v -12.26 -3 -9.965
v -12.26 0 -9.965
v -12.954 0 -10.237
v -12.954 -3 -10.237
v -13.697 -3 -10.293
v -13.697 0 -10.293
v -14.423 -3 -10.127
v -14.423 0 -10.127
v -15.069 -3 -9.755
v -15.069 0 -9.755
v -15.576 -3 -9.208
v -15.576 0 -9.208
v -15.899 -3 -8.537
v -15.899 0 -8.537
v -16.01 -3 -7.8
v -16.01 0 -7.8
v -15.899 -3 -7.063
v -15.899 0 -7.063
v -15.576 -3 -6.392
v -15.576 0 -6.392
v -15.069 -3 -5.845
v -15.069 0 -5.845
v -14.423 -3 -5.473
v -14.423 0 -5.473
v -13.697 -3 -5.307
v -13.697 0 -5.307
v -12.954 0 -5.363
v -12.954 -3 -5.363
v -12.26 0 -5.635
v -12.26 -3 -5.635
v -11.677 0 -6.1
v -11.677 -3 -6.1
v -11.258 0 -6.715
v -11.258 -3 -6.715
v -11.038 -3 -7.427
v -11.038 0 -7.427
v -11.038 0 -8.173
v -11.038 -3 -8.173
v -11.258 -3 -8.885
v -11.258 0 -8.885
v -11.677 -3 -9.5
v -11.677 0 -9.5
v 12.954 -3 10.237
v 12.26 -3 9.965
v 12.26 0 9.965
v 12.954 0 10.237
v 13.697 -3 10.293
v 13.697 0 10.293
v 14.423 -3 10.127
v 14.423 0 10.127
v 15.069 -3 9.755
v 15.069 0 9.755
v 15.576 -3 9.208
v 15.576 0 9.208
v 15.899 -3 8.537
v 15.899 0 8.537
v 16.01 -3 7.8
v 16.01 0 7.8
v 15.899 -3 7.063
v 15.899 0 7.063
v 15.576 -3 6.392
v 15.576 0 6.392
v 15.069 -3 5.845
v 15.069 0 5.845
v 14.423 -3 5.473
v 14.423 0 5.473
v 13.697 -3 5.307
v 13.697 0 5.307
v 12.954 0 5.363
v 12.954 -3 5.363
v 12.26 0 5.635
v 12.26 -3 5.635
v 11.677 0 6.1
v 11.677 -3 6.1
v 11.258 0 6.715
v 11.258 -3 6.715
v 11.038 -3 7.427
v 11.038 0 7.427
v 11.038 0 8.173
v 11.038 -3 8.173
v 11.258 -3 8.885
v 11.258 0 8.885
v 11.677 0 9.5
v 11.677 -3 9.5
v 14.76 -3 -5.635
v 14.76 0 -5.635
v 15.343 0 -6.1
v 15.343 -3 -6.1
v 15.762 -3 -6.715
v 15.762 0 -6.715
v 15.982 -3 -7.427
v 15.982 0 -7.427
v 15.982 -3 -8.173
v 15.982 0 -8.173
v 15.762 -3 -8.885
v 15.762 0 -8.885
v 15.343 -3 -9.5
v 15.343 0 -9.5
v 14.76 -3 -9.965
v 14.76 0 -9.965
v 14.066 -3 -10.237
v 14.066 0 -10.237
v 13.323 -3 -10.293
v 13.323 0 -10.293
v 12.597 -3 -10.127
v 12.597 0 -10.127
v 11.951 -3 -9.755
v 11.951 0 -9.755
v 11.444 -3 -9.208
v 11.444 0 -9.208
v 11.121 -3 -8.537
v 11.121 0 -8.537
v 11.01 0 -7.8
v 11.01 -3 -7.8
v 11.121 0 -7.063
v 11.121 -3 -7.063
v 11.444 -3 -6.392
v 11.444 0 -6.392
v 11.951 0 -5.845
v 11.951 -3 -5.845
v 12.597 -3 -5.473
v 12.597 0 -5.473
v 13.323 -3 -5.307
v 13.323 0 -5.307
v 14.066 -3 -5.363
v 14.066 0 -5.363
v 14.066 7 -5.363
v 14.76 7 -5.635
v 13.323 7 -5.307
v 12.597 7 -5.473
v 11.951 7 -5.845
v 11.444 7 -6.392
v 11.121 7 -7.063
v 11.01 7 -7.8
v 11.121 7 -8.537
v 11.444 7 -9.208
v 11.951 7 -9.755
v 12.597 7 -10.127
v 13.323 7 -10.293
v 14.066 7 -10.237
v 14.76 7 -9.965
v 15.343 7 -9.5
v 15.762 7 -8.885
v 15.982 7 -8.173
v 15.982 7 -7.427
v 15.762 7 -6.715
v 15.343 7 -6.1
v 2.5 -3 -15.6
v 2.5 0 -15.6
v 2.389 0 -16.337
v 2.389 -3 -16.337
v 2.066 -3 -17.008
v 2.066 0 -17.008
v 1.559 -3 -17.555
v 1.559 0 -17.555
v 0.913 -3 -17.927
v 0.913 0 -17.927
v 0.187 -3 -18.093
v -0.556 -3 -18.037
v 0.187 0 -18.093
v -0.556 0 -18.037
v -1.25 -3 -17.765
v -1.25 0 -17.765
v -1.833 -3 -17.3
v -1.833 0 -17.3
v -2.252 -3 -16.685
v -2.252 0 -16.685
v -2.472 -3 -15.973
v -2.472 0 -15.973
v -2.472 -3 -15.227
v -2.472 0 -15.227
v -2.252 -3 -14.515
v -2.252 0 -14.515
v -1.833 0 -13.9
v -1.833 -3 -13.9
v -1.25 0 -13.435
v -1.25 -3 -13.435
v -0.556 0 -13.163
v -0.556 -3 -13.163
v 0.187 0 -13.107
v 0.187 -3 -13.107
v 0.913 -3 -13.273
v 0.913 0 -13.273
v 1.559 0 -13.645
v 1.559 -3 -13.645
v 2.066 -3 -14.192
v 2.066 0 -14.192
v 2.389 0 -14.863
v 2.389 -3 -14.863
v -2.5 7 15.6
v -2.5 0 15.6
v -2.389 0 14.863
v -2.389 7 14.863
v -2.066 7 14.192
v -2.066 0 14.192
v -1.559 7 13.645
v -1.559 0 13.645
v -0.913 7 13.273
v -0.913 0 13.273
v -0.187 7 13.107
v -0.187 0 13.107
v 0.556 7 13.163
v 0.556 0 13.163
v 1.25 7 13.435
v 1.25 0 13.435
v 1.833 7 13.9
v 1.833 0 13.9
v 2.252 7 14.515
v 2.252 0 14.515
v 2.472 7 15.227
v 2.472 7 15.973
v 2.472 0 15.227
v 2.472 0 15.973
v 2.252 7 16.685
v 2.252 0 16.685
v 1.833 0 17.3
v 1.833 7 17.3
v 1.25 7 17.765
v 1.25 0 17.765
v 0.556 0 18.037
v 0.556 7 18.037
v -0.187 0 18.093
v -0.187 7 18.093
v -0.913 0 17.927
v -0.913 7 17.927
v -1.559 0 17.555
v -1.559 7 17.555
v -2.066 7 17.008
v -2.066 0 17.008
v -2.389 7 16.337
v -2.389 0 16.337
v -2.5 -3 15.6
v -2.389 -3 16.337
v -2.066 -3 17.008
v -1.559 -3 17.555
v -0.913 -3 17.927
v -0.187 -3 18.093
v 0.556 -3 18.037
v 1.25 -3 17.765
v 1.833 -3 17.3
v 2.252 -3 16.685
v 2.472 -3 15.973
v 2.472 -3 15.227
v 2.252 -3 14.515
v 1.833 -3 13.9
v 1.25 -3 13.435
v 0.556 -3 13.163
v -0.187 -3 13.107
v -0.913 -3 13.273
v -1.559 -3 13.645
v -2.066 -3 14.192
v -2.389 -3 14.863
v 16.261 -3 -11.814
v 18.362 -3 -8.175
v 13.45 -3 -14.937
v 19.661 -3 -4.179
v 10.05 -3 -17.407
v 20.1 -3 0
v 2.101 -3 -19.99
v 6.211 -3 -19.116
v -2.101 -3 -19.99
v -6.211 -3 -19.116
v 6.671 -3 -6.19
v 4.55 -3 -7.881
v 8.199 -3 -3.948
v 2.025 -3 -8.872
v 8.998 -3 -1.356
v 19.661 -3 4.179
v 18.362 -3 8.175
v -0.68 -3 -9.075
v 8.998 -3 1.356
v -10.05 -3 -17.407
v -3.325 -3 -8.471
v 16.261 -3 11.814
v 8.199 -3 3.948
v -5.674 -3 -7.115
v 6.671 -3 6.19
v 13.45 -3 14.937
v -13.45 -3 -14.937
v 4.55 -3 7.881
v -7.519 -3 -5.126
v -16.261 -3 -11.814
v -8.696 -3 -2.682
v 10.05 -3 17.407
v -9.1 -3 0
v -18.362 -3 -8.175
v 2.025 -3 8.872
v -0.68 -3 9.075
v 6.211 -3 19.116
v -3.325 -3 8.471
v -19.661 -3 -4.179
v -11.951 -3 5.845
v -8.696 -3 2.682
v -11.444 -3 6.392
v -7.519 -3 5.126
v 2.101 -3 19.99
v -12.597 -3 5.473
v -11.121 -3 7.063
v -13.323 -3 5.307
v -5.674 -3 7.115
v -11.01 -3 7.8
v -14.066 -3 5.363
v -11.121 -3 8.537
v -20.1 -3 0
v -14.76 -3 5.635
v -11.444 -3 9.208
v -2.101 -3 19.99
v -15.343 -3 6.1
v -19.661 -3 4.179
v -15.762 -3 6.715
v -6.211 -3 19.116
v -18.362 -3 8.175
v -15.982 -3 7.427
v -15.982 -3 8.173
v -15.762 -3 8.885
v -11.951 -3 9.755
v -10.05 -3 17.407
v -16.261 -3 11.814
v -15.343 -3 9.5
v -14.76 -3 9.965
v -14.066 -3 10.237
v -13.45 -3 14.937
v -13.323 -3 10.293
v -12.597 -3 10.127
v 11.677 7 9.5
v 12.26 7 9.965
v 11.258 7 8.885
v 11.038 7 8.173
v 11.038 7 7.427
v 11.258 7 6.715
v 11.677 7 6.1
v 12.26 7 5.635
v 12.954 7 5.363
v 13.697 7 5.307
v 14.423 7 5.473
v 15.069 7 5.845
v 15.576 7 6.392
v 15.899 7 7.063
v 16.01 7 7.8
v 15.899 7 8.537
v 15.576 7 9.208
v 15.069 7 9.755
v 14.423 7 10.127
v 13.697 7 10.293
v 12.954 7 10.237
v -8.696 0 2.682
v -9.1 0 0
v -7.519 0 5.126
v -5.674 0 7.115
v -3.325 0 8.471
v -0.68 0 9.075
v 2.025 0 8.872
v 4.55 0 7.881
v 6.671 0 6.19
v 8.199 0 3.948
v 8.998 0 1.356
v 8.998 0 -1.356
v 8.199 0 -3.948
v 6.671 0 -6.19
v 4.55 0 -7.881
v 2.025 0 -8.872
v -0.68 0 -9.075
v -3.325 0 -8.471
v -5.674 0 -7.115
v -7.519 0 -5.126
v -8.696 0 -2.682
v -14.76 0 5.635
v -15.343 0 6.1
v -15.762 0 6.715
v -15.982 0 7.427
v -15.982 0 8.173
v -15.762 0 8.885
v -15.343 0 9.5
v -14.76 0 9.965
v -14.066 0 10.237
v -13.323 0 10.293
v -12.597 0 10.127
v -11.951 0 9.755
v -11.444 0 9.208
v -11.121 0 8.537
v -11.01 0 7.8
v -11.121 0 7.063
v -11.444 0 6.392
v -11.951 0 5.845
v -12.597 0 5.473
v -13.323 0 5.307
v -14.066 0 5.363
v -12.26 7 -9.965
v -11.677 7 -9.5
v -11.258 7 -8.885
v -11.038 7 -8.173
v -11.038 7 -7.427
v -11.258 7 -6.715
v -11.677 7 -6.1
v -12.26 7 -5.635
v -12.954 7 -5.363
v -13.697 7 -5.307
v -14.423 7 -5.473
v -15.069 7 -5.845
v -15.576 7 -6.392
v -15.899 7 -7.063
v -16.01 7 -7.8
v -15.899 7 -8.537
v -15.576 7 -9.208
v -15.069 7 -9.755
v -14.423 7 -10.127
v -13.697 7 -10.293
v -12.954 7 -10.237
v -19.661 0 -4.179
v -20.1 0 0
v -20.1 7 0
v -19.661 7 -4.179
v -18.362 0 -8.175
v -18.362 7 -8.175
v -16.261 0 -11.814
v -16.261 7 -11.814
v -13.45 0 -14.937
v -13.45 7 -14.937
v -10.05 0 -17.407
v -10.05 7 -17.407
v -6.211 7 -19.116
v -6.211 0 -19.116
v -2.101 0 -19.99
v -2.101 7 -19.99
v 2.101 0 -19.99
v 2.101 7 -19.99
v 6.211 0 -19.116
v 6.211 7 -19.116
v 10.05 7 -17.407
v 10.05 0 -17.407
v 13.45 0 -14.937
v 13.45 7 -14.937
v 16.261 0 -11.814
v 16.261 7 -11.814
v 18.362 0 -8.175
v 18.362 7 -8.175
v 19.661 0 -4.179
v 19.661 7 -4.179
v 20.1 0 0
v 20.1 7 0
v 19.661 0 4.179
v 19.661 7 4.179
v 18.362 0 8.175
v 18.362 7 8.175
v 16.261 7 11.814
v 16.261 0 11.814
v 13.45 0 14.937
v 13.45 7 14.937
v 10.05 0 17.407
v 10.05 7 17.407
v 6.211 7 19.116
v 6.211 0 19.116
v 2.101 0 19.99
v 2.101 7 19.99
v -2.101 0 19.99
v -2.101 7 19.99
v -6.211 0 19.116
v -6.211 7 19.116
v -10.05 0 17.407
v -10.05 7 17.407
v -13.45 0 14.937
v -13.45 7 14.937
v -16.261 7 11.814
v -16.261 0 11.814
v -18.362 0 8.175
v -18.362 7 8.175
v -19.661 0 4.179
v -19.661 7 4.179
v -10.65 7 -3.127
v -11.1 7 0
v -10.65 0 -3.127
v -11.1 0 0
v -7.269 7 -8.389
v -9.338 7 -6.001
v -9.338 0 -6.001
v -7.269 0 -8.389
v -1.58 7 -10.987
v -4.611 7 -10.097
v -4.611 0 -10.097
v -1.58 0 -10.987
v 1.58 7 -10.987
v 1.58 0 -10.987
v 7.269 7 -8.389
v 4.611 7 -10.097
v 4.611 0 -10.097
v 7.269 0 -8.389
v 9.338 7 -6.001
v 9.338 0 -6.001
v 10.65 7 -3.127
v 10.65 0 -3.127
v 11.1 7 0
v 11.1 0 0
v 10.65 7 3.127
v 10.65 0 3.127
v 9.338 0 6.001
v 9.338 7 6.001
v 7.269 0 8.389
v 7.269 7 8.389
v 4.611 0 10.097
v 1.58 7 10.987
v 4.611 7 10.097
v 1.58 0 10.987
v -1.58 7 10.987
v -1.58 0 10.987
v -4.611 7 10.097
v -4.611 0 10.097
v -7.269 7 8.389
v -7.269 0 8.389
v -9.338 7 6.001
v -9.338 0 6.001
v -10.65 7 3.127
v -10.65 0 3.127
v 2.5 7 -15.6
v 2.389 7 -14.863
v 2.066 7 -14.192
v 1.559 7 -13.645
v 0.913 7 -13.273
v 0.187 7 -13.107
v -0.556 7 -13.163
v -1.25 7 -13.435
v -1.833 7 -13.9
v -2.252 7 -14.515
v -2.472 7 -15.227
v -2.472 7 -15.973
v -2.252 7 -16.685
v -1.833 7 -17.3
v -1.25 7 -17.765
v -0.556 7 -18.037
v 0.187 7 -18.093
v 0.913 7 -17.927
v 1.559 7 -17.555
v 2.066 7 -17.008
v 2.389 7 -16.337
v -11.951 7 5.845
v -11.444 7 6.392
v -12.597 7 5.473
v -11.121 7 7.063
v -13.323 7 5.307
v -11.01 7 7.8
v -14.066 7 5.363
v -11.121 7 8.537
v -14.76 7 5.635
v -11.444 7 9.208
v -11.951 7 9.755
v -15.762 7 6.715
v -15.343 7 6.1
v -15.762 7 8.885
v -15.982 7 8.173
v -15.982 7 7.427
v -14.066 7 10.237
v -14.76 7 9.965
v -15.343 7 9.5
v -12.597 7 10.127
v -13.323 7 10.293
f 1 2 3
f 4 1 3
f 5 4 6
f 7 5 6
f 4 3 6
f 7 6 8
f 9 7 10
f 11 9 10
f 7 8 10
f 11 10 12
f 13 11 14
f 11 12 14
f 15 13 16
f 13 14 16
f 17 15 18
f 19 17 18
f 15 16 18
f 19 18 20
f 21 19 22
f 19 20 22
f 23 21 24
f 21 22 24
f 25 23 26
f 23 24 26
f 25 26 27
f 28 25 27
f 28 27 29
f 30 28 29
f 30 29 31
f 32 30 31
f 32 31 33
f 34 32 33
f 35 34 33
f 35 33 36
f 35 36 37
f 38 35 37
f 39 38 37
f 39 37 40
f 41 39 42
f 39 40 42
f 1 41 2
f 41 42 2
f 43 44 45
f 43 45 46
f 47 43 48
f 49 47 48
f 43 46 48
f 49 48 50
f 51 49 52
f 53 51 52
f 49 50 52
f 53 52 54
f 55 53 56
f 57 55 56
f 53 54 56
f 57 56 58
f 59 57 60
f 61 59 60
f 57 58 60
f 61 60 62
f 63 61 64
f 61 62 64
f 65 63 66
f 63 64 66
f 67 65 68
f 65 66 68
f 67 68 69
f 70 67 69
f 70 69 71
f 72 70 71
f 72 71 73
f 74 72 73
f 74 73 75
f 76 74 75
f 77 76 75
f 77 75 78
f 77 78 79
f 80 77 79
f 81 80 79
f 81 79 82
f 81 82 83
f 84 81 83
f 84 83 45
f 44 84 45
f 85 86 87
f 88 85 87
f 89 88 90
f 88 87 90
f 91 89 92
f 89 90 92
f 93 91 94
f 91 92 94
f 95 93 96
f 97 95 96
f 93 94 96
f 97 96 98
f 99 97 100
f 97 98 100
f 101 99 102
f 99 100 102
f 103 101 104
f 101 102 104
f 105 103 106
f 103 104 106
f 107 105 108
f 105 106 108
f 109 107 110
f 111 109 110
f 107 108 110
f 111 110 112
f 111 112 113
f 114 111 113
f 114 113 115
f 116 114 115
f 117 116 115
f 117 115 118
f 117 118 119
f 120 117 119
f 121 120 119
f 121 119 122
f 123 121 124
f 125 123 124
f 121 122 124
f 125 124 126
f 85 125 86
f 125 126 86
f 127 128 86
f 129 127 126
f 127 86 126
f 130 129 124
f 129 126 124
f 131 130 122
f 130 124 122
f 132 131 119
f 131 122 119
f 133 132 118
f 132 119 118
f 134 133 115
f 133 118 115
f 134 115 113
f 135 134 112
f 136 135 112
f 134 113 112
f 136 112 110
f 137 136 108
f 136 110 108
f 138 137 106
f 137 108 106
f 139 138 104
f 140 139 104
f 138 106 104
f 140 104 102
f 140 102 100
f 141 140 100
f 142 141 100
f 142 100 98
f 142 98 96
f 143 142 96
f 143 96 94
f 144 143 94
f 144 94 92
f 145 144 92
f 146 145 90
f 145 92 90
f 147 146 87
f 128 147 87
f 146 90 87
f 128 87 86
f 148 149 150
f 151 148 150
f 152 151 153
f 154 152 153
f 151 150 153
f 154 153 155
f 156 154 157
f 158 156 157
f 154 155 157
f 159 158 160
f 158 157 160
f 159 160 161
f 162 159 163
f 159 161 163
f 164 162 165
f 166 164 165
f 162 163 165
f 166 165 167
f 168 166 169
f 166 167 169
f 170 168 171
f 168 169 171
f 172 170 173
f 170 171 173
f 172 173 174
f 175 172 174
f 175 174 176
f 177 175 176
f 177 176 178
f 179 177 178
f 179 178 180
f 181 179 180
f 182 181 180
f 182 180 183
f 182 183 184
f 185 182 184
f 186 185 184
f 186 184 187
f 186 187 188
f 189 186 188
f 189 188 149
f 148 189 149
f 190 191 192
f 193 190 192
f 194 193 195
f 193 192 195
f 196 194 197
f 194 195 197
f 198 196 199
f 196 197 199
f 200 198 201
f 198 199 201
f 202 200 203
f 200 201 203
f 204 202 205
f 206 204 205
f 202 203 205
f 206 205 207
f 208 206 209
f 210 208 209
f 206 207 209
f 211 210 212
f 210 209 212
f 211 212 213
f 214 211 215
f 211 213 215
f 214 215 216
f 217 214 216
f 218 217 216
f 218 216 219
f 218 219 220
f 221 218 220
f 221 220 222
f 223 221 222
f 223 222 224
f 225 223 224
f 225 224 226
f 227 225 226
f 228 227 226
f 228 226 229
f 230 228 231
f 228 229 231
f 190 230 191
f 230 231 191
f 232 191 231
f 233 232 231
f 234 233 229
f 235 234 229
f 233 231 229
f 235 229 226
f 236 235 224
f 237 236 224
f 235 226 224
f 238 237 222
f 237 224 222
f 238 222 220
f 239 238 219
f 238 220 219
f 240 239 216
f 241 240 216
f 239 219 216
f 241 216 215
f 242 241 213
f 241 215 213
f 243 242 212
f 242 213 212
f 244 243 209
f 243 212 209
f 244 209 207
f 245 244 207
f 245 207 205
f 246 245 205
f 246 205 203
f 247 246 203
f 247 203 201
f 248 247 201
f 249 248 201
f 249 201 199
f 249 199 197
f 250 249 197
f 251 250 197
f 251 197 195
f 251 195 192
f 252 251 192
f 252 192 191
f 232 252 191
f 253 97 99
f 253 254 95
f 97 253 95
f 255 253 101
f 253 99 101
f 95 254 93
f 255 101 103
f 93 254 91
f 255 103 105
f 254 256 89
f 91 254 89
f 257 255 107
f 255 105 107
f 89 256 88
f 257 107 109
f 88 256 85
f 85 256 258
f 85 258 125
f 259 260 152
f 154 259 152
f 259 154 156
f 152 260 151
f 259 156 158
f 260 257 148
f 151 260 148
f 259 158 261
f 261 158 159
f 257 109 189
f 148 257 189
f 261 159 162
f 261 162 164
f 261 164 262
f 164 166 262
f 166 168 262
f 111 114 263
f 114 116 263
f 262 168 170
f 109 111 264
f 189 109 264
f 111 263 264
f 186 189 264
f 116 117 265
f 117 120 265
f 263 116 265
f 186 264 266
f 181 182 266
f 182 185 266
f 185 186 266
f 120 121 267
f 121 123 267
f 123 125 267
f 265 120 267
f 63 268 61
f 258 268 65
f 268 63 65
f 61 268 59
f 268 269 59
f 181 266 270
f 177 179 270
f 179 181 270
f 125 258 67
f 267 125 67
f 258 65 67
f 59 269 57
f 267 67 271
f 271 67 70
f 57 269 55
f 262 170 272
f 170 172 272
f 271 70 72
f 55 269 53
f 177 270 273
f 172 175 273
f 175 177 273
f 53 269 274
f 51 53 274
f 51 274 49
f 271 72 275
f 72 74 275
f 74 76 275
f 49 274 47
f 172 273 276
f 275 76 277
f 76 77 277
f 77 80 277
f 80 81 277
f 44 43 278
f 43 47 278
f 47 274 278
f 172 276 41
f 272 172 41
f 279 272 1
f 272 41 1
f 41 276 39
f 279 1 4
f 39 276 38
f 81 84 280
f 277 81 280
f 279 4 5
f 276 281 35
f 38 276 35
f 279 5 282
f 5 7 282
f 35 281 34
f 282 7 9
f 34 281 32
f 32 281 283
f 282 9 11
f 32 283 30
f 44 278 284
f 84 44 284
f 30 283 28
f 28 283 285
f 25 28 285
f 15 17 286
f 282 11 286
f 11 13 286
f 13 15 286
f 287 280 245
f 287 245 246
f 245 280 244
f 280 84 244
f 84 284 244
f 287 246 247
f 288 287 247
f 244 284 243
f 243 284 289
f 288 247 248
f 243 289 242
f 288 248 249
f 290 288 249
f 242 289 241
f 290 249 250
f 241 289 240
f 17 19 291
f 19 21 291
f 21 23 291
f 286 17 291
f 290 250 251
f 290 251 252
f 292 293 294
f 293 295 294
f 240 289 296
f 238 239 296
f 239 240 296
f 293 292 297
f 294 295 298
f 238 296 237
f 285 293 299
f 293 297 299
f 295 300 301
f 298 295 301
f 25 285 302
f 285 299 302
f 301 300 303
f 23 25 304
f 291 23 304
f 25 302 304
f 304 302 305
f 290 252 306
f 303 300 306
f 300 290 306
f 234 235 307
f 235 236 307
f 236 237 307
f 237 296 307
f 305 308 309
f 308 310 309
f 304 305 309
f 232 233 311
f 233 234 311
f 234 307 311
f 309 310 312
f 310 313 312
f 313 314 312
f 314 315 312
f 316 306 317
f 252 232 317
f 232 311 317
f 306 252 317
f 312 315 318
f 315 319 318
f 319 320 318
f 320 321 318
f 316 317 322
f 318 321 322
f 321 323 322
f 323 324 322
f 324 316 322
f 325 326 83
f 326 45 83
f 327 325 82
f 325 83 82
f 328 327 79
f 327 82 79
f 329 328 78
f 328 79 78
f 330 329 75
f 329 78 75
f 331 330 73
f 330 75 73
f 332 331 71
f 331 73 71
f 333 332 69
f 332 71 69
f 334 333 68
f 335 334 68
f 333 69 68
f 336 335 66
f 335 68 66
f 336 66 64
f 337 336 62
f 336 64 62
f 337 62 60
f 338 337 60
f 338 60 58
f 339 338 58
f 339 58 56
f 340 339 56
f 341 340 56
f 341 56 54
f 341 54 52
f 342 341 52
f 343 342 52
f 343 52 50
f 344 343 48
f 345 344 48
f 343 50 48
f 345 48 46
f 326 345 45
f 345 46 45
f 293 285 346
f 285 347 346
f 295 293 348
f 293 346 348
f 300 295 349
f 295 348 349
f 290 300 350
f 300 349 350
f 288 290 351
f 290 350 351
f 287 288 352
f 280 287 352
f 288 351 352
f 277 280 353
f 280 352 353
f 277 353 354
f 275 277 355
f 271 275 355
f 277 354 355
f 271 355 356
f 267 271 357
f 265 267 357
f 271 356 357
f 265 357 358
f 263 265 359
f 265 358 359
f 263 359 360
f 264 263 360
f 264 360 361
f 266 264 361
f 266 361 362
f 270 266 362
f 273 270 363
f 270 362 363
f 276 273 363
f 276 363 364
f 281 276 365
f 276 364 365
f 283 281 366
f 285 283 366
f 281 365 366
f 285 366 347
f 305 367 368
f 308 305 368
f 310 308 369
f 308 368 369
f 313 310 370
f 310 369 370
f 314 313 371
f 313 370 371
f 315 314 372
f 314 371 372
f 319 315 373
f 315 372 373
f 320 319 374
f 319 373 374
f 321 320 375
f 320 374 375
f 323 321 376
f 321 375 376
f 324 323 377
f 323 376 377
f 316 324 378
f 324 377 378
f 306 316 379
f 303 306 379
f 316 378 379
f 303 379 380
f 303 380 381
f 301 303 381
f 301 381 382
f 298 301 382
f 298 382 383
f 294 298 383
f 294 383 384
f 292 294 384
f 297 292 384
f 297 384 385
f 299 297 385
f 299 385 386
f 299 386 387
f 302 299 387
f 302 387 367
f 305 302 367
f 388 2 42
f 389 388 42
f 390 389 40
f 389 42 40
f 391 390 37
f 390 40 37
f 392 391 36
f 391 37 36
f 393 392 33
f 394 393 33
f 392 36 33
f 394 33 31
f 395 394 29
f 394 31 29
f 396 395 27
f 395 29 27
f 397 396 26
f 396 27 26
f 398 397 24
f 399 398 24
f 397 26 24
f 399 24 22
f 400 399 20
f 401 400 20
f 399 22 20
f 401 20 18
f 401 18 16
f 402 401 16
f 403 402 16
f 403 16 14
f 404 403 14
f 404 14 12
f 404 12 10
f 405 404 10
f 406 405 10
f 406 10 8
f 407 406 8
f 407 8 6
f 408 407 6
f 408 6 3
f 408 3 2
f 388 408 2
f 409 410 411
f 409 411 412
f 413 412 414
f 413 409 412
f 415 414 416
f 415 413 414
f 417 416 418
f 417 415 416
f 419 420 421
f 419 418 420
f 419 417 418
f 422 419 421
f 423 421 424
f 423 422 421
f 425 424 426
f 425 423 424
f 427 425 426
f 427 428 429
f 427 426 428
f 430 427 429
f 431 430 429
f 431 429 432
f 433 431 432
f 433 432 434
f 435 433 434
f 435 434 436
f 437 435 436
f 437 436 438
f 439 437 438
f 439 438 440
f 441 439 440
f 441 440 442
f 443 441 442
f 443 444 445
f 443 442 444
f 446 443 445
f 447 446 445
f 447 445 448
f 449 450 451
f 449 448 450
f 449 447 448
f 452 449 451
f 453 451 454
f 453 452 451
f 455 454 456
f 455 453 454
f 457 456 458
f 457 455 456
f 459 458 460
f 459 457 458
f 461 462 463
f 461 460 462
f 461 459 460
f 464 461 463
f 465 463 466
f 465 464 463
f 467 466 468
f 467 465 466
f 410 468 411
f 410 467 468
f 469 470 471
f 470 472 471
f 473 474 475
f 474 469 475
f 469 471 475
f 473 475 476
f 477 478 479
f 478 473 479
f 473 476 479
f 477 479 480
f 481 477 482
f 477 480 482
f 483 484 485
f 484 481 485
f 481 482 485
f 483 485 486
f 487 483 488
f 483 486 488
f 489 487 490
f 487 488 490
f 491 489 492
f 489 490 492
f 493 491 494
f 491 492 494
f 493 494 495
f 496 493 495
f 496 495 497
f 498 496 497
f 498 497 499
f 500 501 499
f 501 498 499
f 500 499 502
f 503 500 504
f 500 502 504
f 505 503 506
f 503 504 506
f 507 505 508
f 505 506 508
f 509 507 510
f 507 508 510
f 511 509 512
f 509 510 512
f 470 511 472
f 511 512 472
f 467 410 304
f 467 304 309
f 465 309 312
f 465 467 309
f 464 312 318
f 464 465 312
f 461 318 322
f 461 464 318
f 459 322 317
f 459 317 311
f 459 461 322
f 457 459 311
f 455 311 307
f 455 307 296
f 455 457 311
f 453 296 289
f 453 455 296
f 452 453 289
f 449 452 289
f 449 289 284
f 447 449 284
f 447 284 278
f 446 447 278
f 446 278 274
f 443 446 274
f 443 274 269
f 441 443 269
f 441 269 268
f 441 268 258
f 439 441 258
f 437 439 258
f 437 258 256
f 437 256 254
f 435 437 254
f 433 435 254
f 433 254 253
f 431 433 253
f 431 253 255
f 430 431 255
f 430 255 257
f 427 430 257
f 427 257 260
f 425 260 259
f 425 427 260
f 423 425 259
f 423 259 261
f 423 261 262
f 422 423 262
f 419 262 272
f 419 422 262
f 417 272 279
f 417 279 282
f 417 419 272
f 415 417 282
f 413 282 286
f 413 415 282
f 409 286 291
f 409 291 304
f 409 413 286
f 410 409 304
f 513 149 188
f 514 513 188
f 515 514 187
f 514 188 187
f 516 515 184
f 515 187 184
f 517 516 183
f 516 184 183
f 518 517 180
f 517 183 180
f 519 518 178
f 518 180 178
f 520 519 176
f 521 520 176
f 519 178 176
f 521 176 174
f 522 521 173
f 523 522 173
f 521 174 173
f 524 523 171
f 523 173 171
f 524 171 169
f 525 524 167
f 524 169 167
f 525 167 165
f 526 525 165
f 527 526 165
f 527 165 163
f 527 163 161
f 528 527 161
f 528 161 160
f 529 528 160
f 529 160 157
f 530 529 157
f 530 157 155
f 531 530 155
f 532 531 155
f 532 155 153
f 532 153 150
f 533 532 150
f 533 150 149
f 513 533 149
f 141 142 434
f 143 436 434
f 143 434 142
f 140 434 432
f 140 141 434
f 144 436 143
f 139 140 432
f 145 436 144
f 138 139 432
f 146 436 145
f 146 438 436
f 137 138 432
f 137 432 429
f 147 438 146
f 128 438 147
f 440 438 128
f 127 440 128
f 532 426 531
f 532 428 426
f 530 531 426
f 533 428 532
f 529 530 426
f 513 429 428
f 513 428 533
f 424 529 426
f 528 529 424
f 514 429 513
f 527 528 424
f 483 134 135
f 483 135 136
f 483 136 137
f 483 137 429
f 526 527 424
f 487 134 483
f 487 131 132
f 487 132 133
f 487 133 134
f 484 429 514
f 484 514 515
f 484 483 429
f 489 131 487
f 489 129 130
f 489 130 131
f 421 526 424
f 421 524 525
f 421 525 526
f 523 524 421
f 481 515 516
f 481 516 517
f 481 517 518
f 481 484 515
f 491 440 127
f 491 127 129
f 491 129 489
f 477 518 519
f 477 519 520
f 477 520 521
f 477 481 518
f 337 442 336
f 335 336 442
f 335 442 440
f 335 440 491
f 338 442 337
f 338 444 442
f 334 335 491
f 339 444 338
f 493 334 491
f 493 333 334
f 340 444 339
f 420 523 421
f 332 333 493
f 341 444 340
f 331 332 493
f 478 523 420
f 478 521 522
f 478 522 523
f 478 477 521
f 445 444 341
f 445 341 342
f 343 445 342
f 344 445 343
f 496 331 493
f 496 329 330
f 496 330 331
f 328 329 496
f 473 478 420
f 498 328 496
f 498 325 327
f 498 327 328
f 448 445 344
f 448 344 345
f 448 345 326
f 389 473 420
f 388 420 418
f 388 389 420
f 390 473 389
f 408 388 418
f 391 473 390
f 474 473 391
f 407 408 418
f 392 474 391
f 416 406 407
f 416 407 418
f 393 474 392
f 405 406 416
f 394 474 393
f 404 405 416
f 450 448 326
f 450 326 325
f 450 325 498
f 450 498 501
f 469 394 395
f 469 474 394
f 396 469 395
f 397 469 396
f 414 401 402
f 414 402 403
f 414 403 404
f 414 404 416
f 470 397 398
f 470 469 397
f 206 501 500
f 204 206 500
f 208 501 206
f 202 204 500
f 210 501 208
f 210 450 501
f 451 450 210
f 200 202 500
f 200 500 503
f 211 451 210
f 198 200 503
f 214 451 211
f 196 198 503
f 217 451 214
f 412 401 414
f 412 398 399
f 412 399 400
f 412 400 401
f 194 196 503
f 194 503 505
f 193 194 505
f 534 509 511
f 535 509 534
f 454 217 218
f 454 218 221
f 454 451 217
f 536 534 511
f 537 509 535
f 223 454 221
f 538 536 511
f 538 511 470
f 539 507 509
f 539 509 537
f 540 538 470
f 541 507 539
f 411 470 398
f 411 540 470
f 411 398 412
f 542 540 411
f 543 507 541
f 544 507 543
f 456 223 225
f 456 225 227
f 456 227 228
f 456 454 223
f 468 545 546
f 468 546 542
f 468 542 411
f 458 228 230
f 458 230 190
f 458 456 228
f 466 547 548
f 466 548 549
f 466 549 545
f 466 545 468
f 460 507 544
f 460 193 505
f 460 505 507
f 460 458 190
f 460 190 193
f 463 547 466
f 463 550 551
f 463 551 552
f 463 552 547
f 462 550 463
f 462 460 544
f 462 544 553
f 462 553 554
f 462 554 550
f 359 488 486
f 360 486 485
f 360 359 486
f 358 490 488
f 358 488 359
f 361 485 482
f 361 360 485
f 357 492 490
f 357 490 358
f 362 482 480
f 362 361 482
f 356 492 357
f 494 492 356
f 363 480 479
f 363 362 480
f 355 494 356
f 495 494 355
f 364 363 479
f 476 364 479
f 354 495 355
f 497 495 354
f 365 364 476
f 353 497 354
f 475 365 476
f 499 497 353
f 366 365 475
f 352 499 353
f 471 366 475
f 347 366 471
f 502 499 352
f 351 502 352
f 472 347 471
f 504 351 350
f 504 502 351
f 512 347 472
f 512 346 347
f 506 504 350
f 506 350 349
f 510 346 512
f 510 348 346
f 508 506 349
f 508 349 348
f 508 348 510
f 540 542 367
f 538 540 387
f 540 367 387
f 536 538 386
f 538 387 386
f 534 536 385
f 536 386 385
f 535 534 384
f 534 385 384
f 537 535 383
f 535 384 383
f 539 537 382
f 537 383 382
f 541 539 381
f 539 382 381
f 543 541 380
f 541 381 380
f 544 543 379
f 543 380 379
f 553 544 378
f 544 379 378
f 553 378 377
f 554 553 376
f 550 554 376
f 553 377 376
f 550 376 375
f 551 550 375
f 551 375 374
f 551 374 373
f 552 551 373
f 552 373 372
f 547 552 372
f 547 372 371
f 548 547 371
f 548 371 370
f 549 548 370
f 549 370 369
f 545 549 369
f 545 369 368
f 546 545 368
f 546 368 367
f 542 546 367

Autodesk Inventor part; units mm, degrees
ref_plane "YZ Plane" through (0, 0, 0) normal (1, 0, 0) x (0, 1, 0)
ref_plane "XZ Plane" through (0, 0, 0) normal (0, 1, 0) x (-1, 0, 0)
ref_plane "XY Plane" through (0, 0, 0) normal (0, 0, 1) x (1, 0, 0)
sketch "Sketch1" plane through (0, 0, 0) normal (0, 1, 0) x (-1, 0, 0)
  circle A0 centre (0, 0) radius 11.1
  circle A1 centre (0, 0) radius 20.1
  circle A2 centre (0, 15.6) radius 2.5
  circle A3 centre (0, 0) radius 9.1
  dimension "d0" = 22.2
  dimension "d1" = 9
  dimension "d3" = 5
  dimension "d4" = 15.6
  dimension "d9" = 2
  dimension "d17" = 18.2
extrude "Extrusion1" add sketch "Sketch1" along normal blind 7 contours A1 | A2
extrude "Extrusion3" add sketch "Sketch1" against normal blind 3 contours A0 | A1 | A2
extrude "Extrusion4" cut sketch "Sketch1" along normal through all both and the other way through all contours A2
pattern_circular "Circular Pattern1" count 6 over 360 about axis through (0, 0, 0) along (0, -1, 0) of "Extrusion4"
equation "\"d4\" = 0.5 * d1 + 0.5 * d0"
properties part number "Csapagyhaz"
